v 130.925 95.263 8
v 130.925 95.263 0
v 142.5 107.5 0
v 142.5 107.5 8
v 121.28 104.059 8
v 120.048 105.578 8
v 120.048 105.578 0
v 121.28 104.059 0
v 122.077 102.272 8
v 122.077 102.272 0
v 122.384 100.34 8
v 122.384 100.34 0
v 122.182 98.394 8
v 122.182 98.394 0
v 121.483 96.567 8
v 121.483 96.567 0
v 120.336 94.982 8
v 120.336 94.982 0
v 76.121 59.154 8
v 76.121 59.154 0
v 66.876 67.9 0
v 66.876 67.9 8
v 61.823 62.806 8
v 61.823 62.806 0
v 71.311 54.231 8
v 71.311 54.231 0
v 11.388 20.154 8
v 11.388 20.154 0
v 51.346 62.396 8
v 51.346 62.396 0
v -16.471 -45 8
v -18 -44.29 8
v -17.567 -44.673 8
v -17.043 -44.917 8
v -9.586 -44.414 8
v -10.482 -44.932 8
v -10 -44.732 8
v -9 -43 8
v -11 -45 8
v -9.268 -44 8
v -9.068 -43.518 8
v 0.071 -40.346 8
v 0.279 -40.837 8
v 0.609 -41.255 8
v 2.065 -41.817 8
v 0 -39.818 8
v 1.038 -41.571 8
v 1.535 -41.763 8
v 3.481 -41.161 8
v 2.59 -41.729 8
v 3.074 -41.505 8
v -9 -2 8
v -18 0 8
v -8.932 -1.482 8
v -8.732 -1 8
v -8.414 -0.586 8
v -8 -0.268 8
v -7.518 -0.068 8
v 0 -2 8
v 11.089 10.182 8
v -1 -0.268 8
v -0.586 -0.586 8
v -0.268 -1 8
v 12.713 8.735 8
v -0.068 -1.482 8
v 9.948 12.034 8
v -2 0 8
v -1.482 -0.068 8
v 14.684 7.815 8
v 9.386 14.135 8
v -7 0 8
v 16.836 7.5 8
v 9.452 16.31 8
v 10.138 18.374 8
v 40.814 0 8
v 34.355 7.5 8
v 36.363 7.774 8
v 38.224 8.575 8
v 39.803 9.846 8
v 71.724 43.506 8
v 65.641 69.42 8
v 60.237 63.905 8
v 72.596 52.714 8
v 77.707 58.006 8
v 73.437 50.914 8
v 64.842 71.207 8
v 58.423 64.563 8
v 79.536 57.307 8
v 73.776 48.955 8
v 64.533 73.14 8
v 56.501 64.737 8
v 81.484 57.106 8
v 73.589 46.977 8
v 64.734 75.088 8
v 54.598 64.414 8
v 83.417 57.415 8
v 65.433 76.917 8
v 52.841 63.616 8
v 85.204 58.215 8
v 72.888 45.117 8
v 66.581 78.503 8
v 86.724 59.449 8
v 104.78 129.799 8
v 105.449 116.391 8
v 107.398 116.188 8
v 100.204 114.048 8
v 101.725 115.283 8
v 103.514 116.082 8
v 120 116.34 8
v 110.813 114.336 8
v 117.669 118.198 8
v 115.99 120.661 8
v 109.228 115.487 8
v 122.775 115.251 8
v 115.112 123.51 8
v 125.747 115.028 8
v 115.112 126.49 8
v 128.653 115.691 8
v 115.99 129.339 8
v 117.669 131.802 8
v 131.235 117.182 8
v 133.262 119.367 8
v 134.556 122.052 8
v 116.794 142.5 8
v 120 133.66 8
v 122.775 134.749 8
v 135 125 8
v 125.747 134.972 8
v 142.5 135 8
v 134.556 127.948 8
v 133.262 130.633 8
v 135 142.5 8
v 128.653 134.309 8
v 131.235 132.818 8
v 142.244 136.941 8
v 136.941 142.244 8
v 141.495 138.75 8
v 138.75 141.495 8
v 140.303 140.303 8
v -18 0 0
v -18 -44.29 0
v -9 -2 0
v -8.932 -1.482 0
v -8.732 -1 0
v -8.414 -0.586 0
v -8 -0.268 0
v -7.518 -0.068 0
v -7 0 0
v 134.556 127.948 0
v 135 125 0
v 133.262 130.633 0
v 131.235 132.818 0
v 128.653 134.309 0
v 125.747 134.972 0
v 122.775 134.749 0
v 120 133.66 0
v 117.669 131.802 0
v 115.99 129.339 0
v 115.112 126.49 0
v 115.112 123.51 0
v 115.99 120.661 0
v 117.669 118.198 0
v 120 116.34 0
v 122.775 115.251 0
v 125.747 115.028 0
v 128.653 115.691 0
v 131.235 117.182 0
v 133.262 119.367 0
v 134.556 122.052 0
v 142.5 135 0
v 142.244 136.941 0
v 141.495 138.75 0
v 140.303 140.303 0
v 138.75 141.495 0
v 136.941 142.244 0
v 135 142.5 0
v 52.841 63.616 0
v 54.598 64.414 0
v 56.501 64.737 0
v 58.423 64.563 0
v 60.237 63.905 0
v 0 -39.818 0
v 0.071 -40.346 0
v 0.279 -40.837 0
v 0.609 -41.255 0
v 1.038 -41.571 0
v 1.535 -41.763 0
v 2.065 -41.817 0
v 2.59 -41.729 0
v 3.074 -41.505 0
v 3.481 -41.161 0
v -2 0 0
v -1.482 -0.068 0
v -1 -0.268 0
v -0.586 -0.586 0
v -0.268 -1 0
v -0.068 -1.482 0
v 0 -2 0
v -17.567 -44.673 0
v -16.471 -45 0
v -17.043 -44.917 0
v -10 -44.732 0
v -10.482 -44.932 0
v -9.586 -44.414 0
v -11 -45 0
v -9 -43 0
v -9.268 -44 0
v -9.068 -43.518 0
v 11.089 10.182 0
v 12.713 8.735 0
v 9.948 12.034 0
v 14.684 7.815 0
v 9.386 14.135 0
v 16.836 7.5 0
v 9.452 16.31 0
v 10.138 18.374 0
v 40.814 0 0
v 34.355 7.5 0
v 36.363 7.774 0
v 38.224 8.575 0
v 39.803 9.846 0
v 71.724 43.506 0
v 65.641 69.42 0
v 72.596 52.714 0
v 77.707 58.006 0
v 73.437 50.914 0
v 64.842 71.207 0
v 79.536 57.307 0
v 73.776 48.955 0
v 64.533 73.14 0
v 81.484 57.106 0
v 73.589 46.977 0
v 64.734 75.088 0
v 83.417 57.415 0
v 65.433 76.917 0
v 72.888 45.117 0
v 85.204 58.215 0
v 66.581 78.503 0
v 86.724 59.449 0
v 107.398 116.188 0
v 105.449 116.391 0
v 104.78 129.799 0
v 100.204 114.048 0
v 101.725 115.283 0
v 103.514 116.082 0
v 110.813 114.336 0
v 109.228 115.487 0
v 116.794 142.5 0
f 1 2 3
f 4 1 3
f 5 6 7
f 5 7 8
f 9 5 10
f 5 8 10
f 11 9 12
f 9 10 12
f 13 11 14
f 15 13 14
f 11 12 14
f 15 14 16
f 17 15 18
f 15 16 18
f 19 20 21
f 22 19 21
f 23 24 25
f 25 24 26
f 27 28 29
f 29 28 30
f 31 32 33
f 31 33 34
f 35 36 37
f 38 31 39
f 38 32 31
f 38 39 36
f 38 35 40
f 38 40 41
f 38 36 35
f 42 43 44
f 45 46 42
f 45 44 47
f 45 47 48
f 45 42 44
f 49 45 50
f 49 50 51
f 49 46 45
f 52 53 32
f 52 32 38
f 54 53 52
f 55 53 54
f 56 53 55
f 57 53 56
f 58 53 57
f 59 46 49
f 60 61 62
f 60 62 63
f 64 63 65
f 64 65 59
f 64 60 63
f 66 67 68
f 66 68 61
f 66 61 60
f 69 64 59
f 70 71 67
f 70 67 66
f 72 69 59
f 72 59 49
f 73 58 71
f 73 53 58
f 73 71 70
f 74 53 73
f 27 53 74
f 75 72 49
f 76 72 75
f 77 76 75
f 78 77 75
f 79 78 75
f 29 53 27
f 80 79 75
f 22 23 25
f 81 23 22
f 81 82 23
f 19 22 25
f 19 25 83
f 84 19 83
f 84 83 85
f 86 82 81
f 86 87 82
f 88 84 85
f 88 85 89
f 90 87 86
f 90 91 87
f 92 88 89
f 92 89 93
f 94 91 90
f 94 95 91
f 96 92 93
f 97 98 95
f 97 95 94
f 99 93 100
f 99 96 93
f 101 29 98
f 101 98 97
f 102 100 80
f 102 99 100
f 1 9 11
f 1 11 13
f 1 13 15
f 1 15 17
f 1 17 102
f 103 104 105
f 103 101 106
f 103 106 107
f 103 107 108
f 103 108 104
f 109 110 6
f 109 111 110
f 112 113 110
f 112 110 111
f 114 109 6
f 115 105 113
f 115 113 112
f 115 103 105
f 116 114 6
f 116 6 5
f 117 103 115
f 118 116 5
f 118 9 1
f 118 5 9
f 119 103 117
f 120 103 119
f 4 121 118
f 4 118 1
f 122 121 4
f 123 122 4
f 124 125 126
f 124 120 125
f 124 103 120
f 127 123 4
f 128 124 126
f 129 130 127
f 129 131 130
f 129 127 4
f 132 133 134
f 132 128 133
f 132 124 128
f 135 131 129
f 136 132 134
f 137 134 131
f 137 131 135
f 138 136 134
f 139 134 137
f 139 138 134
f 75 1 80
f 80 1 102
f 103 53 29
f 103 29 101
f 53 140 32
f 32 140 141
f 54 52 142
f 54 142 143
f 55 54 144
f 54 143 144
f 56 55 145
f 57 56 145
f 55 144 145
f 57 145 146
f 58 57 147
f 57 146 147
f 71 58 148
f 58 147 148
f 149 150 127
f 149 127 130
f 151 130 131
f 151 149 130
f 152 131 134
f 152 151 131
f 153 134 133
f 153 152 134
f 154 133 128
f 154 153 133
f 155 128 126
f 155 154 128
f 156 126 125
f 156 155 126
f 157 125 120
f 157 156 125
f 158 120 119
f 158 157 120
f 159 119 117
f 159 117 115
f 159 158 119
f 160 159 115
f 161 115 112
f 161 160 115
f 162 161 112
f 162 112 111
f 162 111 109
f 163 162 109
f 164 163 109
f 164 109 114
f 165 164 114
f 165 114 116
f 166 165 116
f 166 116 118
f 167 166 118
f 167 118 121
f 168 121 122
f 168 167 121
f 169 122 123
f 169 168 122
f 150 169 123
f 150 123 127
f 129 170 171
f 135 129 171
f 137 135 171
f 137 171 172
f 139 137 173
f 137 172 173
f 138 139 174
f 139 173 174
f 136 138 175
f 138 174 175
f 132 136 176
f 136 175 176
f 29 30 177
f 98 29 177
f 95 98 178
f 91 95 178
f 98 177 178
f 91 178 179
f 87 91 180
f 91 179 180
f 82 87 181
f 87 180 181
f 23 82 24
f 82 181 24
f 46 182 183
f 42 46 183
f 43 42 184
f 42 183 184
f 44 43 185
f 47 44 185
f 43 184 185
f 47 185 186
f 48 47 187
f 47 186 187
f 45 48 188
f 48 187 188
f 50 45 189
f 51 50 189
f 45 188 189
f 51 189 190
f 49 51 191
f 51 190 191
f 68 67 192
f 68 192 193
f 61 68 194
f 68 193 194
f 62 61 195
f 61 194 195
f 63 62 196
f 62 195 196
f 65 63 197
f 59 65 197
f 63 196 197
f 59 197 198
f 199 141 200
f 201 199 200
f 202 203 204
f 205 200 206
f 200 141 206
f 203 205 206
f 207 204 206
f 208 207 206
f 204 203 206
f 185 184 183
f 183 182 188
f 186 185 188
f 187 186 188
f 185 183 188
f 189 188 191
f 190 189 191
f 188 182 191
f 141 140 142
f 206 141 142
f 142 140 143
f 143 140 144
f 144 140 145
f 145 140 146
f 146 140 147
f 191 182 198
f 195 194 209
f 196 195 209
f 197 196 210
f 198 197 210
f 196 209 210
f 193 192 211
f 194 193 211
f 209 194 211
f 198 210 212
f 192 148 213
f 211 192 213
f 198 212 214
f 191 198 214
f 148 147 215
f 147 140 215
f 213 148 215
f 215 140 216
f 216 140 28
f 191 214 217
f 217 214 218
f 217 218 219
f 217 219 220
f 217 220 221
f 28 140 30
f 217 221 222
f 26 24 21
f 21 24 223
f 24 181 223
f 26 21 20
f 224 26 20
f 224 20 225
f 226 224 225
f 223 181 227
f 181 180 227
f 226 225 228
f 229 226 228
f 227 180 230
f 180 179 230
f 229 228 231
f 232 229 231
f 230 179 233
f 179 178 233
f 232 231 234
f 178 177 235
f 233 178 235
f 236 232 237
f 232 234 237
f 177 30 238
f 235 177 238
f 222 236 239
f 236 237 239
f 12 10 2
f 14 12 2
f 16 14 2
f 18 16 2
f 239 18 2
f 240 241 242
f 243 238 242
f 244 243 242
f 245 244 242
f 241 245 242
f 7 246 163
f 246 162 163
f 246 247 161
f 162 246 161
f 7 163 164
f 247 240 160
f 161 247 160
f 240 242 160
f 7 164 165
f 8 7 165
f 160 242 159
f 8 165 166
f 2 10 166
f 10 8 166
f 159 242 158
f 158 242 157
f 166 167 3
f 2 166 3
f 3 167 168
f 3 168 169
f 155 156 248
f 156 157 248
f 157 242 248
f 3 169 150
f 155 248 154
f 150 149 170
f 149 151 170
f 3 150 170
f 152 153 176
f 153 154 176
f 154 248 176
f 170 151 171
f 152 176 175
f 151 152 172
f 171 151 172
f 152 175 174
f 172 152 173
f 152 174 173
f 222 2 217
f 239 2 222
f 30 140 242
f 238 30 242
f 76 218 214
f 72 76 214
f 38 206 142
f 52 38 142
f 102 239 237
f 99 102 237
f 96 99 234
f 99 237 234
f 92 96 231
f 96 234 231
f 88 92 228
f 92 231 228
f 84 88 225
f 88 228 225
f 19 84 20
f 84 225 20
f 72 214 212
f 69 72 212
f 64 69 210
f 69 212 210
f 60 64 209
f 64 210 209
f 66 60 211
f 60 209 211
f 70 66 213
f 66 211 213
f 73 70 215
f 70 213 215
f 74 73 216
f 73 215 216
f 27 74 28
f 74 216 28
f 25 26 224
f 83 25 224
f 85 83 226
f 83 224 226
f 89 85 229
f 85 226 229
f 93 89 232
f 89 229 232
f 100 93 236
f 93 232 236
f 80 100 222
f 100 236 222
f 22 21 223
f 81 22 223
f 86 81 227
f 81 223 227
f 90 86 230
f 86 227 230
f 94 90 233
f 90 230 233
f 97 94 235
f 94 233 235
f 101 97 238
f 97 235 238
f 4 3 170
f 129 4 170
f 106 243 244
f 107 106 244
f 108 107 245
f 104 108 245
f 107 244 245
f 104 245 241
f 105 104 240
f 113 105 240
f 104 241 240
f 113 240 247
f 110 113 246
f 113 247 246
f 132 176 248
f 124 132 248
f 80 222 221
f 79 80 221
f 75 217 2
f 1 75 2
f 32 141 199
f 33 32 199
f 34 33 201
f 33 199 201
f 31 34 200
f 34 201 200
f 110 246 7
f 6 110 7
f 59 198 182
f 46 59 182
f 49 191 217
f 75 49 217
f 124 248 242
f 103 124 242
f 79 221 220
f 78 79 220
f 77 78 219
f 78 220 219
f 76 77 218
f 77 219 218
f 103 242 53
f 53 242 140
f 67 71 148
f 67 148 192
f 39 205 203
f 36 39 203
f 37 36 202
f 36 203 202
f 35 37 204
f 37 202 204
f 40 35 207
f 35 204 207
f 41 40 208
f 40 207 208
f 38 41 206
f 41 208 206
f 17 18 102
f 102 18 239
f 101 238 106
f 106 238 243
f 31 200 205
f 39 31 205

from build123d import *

# Parameters (mm, degrees)
F0_R     = 10
F1_DEPTH = 8


with BuildPart() as f1:
    # F0 (on Top) → F1 (new body)
    with BuildSketch(Plane.XY):
        with BuildLine():
            ThreePointArc((-2, 0), (-0.585786, -0.585786), (0, -2))
            Line((0, -2), (0, -39.817824))
            ThreePointArc((0, -39.817824), (1.279892, -41.683687), (3.481445, -41.161447))
            Line((3.481445, -41.161447), (40.813559, 0))
            Line((40.813559, 0), (130.9251, 95.263347))
            Line((130.9251, 95.263347), (142.5, 107.5))
            Line((142.5, 107.5), (142.5, 125))
            Line((142.5, 125), (142.5, 135))
            ThreePointArc((142.5, 135), (140.303301, 140.303301), (135, 142.5))
            Line((135, 142.5), (116.793654, 142.5))
            Line((116.793654, 142.5), (104.779634, 129.799121))
            Line((104.779634, 129.799121), (-18, 0))
            Line((-18, 0), (-18, -44.289797))
            ThreePointArc((-18, -44.289797), (-17.314199, -44.81378), (-16.471463, -45))
            Line((-16.471463, -45), (-11, -45))
            ThreePointArc((-11, -45), (-9.585786, -44.414214), (-9, -43))
            Line((-9, -43), (-9, -2))
            ThreePointArc((-9, -2), (-8.414214, -0.585786), (-7, 0))
            Line((-7, 0), (-2, 0))
        make_face()
        with BuildLine():
            Line((34.354794, 7.5), (16.836377, 7.5))
            ThreePointArc((16.836377, 7.5), (9.94782, 12.033895), (11.387794, 20.153925))
            Line((11.387794, 20.153925), (51.345731, 62.396315))
            ThreePointArc((51.345731, 62.396315), (56.501034, 64.736653), (61.823464, 62.80635))
            Line((61.823464, 62.80635), (71.310982, 54.230777))
            ThreePointArc((71.310982, 54.230777), (73.77628, 48.955349), (71.723881, 43.505992))
            Line((71.723881, 43.505992), (39.803376, 9.846075))
            ThreePointArc((39.803376, 9.846075), (37.320899, 8.111443), (34.354794, 7.5))
        make_face(mode=Mode.SUBTRACT)
        with BuildLine():
            ThreePointArc((120.047881, 105.578456), (122.384292, 100.340012), (120.335639, 94.982482))
            Line((120.335639, 94.982482), (86.723895, 59.449106))
            ThreePointArc((86.723895, 59.449106), (81.483666, 57.105926), (76.121387, 59.154449))
            Line((76.121387, 59.154449), (66.875695, 67.900137))
            ThreePointArc((66.875695, 67.900137), (64.532515, 73.140366), (66.581038, 78.502645))
            Line((66.581038, 78.502645), (100.203863, 114.047735))
            ThreePointArc((100.203863, 114.047735), (105.448841, 116.391046), (110.81327, 114.335858))
            Line((110.81327, 114.335858), (120.047881, 105.578456))
        make_face(mode=Mode.SUBTRACT)
        with Locations((125, 125)):
            Circle(F0_R, mode=Mode.SUBTRACT)
    extrude(amount=F1_DEPTH)


solid = f1.part
